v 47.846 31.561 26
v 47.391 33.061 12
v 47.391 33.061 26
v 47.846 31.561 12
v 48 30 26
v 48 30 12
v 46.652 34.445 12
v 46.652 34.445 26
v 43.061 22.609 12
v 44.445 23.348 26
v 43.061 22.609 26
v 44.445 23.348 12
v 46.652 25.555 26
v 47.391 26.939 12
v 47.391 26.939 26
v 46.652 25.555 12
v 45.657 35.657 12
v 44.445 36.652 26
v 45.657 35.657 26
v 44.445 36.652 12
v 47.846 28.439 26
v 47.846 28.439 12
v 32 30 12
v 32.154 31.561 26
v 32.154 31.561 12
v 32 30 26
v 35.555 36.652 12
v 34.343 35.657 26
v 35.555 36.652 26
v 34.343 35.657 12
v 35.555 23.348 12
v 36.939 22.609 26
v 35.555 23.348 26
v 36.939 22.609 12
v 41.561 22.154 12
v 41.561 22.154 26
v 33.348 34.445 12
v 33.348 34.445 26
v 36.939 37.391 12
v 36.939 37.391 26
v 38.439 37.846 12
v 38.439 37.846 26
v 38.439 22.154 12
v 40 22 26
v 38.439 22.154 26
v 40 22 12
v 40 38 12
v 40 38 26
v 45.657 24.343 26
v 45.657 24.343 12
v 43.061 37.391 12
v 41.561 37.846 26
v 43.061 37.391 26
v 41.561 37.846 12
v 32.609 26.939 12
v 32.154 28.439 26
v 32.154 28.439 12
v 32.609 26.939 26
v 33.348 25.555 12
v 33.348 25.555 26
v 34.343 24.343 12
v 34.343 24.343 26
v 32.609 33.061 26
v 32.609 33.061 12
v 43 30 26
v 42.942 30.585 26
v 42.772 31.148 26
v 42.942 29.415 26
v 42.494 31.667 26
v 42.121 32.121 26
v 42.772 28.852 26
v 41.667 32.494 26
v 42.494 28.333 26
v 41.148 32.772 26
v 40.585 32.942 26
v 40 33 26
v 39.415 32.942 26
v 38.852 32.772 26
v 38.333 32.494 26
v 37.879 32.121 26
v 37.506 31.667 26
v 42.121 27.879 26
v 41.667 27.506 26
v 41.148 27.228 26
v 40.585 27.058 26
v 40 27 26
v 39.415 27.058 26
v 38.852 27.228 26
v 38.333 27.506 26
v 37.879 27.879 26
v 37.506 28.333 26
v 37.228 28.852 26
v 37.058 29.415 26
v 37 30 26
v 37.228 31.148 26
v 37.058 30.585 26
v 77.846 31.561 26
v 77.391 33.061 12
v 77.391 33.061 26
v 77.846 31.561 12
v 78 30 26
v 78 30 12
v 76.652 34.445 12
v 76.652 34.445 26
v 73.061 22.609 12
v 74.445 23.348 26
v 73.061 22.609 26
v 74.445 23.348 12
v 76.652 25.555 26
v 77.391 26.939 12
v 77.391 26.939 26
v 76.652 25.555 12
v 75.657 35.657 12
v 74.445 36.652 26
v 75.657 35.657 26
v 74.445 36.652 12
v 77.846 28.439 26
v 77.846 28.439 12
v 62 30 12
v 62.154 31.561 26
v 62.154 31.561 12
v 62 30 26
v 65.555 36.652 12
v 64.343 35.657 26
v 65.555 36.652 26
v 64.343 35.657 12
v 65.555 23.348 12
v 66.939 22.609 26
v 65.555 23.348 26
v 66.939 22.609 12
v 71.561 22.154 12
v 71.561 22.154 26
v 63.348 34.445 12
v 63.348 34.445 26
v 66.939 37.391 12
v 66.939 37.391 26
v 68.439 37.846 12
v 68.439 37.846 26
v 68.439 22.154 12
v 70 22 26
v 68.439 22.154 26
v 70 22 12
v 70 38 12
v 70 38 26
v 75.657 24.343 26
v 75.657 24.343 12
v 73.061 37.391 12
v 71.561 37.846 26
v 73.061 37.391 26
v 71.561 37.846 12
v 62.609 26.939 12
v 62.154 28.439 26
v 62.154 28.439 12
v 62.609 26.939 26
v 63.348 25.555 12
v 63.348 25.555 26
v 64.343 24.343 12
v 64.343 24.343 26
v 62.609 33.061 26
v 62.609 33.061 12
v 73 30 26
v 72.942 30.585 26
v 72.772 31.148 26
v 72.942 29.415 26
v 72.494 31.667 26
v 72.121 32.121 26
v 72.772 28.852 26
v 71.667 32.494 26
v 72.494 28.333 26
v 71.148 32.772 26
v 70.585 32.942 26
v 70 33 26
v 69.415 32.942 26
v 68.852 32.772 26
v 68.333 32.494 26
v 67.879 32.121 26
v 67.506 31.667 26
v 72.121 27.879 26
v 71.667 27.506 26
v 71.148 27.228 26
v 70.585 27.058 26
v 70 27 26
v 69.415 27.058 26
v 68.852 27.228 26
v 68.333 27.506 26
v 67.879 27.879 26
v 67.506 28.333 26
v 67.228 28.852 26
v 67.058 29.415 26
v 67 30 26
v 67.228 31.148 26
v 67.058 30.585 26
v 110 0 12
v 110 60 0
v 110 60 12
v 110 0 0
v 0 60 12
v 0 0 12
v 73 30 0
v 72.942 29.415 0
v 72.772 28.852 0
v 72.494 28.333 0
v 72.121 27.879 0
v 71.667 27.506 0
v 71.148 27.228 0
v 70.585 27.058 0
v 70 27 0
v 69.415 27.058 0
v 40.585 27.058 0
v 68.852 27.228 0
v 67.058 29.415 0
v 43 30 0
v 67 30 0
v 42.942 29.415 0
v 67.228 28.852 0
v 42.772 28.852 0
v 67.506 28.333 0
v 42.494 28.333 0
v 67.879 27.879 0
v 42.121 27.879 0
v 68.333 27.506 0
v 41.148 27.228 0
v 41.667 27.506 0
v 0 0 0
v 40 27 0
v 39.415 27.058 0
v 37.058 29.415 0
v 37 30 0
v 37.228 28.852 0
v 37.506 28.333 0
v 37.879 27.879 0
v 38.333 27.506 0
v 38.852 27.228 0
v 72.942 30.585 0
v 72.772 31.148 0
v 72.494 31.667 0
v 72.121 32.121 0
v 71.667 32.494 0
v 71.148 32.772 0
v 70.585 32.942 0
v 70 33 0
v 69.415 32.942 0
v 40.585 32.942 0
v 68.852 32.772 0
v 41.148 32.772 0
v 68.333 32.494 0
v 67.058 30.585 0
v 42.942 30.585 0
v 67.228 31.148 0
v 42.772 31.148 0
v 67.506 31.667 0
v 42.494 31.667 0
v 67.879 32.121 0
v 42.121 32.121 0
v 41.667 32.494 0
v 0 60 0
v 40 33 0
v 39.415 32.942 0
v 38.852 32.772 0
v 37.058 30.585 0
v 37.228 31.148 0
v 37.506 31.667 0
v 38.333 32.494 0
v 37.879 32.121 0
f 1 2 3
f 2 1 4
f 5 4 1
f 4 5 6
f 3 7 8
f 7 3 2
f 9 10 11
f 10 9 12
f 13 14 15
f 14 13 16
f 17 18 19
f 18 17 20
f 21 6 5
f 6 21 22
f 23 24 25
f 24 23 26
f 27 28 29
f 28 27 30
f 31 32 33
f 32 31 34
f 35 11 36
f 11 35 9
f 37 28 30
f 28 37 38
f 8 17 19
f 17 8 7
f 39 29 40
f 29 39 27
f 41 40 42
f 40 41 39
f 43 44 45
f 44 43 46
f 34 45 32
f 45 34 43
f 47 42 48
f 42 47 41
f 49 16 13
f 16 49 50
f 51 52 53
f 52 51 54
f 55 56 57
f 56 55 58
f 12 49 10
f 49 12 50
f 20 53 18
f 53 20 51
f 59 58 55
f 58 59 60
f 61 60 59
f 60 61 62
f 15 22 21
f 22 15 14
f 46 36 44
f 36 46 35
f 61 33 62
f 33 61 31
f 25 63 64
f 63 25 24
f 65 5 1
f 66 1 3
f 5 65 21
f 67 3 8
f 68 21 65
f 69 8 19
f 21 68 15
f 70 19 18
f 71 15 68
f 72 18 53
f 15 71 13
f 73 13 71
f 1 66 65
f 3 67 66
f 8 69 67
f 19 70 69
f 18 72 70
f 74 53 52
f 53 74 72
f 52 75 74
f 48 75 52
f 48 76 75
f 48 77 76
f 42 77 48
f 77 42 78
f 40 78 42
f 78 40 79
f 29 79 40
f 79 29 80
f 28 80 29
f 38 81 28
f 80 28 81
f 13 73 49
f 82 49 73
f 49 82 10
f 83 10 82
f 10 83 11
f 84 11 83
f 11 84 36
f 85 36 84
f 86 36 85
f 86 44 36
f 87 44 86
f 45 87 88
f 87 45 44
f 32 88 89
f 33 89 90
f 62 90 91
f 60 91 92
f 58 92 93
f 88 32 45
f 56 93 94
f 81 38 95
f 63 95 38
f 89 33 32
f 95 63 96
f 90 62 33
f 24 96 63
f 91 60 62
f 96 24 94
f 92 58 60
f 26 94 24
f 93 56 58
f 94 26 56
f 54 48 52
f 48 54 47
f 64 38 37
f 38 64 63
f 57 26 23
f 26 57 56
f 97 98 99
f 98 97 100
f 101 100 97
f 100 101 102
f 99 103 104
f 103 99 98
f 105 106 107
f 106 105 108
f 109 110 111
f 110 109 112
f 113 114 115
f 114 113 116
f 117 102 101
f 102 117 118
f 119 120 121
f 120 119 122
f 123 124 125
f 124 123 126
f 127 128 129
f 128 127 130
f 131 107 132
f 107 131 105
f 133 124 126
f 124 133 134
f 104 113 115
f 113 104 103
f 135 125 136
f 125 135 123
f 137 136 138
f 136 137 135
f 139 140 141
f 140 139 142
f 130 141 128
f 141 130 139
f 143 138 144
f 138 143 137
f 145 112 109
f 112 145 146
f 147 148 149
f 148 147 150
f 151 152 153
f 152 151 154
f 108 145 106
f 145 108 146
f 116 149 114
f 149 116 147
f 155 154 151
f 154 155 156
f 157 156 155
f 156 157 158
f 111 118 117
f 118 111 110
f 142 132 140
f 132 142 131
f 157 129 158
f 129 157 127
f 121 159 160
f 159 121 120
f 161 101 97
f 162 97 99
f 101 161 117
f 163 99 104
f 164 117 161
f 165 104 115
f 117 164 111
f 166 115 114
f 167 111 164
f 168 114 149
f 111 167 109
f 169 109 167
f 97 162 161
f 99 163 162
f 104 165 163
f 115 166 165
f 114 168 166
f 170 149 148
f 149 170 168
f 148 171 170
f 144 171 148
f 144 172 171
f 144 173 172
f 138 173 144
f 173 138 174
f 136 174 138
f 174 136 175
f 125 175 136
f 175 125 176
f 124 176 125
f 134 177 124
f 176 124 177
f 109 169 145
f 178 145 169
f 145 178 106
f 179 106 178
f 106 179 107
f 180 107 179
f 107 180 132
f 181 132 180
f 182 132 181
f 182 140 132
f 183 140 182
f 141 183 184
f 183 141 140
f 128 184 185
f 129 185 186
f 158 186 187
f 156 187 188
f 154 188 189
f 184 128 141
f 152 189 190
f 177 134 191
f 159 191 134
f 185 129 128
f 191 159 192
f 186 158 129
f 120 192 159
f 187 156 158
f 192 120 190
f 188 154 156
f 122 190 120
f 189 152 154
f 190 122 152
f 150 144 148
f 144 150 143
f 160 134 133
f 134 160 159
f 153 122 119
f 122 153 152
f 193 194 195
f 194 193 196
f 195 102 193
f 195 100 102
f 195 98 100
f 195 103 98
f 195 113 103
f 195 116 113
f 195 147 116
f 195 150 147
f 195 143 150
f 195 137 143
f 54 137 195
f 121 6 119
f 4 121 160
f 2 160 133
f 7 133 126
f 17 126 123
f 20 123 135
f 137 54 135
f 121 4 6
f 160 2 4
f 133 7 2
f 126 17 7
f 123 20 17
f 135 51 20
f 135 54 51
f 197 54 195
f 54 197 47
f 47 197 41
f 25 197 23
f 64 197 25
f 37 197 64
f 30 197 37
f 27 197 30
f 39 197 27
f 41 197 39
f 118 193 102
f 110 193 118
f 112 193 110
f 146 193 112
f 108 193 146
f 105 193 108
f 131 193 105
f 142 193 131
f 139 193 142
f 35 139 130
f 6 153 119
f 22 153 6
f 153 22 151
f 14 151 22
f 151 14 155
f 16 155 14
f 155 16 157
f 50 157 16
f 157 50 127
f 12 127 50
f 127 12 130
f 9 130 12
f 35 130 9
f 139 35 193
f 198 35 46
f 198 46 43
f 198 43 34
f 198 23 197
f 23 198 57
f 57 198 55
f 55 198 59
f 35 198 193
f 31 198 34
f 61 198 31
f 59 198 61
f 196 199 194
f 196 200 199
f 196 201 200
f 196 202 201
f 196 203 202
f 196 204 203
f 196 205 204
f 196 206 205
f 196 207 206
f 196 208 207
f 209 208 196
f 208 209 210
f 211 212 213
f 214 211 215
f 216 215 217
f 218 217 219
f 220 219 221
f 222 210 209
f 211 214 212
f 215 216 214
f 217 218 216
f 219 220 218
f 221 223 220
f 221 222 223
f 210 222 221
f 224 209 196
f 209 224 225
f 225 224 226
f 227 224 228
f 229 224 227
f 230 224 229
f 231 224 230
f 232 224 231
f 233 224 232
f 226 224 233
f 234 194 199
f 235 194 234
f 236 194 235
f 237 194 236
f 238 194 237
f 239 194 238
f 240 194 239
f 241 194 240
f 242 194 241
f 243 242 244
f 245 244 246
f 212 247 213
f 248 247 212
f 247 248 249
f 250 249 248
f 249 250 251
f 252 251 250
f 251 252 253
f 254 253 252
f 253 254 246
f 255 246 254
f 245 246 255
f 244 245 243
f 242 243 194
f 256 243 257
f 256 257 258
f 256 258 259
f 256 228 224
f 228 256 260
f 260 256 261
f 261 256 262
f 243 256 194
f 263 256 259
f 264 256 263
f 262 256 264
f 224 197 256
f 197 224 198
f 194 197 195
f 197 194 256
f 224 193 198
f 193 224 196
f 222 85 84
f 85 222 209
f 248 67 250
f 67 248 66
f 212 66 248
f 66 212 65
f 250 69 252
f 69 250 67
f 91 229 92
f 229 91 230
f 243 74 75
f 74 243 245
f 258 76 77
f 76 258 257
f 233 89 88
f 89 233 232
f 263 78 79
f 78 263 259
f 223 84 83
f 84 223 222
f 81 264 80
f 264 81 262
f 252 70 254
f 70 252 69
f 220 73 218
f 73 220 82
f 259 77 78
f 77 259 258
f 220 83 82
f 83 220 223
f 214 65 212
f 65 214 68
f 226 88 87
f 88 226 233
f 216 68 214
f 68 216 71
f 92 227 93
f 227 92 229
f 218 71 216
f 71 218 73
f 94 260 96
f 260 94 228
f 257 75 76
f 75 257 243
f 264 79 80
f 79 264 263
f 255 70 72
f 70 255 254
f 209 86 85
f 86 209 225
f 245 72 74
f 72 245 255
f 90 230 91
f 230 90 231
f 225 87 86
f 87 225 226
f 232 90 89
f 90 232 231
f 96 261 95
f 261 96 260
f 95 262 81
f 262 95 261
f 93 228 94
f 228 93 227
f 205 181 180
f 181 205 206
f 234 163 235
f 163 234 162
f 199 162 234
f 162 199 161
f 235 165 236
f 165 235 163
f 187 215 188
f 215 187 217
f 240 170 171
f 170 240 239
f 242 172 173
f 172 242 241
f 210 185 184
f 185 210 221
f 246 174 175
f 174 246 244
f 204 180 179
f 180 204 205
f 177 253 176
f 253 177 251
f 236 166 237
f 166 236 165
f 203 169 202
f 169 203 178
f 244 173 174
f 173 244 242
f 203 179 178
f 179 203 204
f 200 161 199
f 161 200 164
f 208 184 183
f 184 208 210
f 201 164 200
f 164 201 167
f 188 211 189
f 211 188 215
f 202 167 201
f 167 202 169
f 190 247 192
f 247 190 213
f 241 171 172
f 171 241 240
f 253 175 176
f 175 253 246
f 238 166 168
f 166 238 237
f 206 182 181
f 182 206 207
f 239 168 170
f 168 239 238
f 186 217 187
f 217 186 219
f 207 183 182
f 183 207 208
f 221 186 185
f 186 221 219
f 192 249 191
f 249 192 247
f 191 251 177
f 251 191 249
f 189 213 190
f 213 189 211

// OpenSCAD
$fn = 32;

// ----------------------------------------------------------------------
// Drill jig: two_boss jig
// ----------------------------------------------------------------------

// --- parameters (mm) ---
plate_l = 110;            // plate length, X
plate_w = 60;             // plate width, Y
plate_t = 12;             // plate thickness
boss_d = 16;              // guide boss diameter
boss_h = 15;              // boss height above the plate
guide_d = 6;              // guide hole diameter
boss_pitch = 30;          // boss pitch

n_boss = 2;  // guide bosses
boss_x0 = (plate_l - (n_boss - 1) * boss_pitch) / 2;  // first boss X
boss_top = plate_t - 1 + boss_h;  // boss crown height
total_h = boss_top;  // overall height

difference() {
  union() {
  cube([plate_l, plate_w, plate_t]);
  for (i = [0 : n_boss - 1])
    translate([boss_x0 + i * boss_pitch, plate_w / 2, plate_t - 1])
      cylinder(h = boss_h, d = boss_d);
  }
  for (i = [0 : n_boss - 1])
    translate([boss_x0 + i * boss_pitch, plate_w / 2, -1])
      cylinder(h = plate_t + boss_h, d = guide_d);
}
